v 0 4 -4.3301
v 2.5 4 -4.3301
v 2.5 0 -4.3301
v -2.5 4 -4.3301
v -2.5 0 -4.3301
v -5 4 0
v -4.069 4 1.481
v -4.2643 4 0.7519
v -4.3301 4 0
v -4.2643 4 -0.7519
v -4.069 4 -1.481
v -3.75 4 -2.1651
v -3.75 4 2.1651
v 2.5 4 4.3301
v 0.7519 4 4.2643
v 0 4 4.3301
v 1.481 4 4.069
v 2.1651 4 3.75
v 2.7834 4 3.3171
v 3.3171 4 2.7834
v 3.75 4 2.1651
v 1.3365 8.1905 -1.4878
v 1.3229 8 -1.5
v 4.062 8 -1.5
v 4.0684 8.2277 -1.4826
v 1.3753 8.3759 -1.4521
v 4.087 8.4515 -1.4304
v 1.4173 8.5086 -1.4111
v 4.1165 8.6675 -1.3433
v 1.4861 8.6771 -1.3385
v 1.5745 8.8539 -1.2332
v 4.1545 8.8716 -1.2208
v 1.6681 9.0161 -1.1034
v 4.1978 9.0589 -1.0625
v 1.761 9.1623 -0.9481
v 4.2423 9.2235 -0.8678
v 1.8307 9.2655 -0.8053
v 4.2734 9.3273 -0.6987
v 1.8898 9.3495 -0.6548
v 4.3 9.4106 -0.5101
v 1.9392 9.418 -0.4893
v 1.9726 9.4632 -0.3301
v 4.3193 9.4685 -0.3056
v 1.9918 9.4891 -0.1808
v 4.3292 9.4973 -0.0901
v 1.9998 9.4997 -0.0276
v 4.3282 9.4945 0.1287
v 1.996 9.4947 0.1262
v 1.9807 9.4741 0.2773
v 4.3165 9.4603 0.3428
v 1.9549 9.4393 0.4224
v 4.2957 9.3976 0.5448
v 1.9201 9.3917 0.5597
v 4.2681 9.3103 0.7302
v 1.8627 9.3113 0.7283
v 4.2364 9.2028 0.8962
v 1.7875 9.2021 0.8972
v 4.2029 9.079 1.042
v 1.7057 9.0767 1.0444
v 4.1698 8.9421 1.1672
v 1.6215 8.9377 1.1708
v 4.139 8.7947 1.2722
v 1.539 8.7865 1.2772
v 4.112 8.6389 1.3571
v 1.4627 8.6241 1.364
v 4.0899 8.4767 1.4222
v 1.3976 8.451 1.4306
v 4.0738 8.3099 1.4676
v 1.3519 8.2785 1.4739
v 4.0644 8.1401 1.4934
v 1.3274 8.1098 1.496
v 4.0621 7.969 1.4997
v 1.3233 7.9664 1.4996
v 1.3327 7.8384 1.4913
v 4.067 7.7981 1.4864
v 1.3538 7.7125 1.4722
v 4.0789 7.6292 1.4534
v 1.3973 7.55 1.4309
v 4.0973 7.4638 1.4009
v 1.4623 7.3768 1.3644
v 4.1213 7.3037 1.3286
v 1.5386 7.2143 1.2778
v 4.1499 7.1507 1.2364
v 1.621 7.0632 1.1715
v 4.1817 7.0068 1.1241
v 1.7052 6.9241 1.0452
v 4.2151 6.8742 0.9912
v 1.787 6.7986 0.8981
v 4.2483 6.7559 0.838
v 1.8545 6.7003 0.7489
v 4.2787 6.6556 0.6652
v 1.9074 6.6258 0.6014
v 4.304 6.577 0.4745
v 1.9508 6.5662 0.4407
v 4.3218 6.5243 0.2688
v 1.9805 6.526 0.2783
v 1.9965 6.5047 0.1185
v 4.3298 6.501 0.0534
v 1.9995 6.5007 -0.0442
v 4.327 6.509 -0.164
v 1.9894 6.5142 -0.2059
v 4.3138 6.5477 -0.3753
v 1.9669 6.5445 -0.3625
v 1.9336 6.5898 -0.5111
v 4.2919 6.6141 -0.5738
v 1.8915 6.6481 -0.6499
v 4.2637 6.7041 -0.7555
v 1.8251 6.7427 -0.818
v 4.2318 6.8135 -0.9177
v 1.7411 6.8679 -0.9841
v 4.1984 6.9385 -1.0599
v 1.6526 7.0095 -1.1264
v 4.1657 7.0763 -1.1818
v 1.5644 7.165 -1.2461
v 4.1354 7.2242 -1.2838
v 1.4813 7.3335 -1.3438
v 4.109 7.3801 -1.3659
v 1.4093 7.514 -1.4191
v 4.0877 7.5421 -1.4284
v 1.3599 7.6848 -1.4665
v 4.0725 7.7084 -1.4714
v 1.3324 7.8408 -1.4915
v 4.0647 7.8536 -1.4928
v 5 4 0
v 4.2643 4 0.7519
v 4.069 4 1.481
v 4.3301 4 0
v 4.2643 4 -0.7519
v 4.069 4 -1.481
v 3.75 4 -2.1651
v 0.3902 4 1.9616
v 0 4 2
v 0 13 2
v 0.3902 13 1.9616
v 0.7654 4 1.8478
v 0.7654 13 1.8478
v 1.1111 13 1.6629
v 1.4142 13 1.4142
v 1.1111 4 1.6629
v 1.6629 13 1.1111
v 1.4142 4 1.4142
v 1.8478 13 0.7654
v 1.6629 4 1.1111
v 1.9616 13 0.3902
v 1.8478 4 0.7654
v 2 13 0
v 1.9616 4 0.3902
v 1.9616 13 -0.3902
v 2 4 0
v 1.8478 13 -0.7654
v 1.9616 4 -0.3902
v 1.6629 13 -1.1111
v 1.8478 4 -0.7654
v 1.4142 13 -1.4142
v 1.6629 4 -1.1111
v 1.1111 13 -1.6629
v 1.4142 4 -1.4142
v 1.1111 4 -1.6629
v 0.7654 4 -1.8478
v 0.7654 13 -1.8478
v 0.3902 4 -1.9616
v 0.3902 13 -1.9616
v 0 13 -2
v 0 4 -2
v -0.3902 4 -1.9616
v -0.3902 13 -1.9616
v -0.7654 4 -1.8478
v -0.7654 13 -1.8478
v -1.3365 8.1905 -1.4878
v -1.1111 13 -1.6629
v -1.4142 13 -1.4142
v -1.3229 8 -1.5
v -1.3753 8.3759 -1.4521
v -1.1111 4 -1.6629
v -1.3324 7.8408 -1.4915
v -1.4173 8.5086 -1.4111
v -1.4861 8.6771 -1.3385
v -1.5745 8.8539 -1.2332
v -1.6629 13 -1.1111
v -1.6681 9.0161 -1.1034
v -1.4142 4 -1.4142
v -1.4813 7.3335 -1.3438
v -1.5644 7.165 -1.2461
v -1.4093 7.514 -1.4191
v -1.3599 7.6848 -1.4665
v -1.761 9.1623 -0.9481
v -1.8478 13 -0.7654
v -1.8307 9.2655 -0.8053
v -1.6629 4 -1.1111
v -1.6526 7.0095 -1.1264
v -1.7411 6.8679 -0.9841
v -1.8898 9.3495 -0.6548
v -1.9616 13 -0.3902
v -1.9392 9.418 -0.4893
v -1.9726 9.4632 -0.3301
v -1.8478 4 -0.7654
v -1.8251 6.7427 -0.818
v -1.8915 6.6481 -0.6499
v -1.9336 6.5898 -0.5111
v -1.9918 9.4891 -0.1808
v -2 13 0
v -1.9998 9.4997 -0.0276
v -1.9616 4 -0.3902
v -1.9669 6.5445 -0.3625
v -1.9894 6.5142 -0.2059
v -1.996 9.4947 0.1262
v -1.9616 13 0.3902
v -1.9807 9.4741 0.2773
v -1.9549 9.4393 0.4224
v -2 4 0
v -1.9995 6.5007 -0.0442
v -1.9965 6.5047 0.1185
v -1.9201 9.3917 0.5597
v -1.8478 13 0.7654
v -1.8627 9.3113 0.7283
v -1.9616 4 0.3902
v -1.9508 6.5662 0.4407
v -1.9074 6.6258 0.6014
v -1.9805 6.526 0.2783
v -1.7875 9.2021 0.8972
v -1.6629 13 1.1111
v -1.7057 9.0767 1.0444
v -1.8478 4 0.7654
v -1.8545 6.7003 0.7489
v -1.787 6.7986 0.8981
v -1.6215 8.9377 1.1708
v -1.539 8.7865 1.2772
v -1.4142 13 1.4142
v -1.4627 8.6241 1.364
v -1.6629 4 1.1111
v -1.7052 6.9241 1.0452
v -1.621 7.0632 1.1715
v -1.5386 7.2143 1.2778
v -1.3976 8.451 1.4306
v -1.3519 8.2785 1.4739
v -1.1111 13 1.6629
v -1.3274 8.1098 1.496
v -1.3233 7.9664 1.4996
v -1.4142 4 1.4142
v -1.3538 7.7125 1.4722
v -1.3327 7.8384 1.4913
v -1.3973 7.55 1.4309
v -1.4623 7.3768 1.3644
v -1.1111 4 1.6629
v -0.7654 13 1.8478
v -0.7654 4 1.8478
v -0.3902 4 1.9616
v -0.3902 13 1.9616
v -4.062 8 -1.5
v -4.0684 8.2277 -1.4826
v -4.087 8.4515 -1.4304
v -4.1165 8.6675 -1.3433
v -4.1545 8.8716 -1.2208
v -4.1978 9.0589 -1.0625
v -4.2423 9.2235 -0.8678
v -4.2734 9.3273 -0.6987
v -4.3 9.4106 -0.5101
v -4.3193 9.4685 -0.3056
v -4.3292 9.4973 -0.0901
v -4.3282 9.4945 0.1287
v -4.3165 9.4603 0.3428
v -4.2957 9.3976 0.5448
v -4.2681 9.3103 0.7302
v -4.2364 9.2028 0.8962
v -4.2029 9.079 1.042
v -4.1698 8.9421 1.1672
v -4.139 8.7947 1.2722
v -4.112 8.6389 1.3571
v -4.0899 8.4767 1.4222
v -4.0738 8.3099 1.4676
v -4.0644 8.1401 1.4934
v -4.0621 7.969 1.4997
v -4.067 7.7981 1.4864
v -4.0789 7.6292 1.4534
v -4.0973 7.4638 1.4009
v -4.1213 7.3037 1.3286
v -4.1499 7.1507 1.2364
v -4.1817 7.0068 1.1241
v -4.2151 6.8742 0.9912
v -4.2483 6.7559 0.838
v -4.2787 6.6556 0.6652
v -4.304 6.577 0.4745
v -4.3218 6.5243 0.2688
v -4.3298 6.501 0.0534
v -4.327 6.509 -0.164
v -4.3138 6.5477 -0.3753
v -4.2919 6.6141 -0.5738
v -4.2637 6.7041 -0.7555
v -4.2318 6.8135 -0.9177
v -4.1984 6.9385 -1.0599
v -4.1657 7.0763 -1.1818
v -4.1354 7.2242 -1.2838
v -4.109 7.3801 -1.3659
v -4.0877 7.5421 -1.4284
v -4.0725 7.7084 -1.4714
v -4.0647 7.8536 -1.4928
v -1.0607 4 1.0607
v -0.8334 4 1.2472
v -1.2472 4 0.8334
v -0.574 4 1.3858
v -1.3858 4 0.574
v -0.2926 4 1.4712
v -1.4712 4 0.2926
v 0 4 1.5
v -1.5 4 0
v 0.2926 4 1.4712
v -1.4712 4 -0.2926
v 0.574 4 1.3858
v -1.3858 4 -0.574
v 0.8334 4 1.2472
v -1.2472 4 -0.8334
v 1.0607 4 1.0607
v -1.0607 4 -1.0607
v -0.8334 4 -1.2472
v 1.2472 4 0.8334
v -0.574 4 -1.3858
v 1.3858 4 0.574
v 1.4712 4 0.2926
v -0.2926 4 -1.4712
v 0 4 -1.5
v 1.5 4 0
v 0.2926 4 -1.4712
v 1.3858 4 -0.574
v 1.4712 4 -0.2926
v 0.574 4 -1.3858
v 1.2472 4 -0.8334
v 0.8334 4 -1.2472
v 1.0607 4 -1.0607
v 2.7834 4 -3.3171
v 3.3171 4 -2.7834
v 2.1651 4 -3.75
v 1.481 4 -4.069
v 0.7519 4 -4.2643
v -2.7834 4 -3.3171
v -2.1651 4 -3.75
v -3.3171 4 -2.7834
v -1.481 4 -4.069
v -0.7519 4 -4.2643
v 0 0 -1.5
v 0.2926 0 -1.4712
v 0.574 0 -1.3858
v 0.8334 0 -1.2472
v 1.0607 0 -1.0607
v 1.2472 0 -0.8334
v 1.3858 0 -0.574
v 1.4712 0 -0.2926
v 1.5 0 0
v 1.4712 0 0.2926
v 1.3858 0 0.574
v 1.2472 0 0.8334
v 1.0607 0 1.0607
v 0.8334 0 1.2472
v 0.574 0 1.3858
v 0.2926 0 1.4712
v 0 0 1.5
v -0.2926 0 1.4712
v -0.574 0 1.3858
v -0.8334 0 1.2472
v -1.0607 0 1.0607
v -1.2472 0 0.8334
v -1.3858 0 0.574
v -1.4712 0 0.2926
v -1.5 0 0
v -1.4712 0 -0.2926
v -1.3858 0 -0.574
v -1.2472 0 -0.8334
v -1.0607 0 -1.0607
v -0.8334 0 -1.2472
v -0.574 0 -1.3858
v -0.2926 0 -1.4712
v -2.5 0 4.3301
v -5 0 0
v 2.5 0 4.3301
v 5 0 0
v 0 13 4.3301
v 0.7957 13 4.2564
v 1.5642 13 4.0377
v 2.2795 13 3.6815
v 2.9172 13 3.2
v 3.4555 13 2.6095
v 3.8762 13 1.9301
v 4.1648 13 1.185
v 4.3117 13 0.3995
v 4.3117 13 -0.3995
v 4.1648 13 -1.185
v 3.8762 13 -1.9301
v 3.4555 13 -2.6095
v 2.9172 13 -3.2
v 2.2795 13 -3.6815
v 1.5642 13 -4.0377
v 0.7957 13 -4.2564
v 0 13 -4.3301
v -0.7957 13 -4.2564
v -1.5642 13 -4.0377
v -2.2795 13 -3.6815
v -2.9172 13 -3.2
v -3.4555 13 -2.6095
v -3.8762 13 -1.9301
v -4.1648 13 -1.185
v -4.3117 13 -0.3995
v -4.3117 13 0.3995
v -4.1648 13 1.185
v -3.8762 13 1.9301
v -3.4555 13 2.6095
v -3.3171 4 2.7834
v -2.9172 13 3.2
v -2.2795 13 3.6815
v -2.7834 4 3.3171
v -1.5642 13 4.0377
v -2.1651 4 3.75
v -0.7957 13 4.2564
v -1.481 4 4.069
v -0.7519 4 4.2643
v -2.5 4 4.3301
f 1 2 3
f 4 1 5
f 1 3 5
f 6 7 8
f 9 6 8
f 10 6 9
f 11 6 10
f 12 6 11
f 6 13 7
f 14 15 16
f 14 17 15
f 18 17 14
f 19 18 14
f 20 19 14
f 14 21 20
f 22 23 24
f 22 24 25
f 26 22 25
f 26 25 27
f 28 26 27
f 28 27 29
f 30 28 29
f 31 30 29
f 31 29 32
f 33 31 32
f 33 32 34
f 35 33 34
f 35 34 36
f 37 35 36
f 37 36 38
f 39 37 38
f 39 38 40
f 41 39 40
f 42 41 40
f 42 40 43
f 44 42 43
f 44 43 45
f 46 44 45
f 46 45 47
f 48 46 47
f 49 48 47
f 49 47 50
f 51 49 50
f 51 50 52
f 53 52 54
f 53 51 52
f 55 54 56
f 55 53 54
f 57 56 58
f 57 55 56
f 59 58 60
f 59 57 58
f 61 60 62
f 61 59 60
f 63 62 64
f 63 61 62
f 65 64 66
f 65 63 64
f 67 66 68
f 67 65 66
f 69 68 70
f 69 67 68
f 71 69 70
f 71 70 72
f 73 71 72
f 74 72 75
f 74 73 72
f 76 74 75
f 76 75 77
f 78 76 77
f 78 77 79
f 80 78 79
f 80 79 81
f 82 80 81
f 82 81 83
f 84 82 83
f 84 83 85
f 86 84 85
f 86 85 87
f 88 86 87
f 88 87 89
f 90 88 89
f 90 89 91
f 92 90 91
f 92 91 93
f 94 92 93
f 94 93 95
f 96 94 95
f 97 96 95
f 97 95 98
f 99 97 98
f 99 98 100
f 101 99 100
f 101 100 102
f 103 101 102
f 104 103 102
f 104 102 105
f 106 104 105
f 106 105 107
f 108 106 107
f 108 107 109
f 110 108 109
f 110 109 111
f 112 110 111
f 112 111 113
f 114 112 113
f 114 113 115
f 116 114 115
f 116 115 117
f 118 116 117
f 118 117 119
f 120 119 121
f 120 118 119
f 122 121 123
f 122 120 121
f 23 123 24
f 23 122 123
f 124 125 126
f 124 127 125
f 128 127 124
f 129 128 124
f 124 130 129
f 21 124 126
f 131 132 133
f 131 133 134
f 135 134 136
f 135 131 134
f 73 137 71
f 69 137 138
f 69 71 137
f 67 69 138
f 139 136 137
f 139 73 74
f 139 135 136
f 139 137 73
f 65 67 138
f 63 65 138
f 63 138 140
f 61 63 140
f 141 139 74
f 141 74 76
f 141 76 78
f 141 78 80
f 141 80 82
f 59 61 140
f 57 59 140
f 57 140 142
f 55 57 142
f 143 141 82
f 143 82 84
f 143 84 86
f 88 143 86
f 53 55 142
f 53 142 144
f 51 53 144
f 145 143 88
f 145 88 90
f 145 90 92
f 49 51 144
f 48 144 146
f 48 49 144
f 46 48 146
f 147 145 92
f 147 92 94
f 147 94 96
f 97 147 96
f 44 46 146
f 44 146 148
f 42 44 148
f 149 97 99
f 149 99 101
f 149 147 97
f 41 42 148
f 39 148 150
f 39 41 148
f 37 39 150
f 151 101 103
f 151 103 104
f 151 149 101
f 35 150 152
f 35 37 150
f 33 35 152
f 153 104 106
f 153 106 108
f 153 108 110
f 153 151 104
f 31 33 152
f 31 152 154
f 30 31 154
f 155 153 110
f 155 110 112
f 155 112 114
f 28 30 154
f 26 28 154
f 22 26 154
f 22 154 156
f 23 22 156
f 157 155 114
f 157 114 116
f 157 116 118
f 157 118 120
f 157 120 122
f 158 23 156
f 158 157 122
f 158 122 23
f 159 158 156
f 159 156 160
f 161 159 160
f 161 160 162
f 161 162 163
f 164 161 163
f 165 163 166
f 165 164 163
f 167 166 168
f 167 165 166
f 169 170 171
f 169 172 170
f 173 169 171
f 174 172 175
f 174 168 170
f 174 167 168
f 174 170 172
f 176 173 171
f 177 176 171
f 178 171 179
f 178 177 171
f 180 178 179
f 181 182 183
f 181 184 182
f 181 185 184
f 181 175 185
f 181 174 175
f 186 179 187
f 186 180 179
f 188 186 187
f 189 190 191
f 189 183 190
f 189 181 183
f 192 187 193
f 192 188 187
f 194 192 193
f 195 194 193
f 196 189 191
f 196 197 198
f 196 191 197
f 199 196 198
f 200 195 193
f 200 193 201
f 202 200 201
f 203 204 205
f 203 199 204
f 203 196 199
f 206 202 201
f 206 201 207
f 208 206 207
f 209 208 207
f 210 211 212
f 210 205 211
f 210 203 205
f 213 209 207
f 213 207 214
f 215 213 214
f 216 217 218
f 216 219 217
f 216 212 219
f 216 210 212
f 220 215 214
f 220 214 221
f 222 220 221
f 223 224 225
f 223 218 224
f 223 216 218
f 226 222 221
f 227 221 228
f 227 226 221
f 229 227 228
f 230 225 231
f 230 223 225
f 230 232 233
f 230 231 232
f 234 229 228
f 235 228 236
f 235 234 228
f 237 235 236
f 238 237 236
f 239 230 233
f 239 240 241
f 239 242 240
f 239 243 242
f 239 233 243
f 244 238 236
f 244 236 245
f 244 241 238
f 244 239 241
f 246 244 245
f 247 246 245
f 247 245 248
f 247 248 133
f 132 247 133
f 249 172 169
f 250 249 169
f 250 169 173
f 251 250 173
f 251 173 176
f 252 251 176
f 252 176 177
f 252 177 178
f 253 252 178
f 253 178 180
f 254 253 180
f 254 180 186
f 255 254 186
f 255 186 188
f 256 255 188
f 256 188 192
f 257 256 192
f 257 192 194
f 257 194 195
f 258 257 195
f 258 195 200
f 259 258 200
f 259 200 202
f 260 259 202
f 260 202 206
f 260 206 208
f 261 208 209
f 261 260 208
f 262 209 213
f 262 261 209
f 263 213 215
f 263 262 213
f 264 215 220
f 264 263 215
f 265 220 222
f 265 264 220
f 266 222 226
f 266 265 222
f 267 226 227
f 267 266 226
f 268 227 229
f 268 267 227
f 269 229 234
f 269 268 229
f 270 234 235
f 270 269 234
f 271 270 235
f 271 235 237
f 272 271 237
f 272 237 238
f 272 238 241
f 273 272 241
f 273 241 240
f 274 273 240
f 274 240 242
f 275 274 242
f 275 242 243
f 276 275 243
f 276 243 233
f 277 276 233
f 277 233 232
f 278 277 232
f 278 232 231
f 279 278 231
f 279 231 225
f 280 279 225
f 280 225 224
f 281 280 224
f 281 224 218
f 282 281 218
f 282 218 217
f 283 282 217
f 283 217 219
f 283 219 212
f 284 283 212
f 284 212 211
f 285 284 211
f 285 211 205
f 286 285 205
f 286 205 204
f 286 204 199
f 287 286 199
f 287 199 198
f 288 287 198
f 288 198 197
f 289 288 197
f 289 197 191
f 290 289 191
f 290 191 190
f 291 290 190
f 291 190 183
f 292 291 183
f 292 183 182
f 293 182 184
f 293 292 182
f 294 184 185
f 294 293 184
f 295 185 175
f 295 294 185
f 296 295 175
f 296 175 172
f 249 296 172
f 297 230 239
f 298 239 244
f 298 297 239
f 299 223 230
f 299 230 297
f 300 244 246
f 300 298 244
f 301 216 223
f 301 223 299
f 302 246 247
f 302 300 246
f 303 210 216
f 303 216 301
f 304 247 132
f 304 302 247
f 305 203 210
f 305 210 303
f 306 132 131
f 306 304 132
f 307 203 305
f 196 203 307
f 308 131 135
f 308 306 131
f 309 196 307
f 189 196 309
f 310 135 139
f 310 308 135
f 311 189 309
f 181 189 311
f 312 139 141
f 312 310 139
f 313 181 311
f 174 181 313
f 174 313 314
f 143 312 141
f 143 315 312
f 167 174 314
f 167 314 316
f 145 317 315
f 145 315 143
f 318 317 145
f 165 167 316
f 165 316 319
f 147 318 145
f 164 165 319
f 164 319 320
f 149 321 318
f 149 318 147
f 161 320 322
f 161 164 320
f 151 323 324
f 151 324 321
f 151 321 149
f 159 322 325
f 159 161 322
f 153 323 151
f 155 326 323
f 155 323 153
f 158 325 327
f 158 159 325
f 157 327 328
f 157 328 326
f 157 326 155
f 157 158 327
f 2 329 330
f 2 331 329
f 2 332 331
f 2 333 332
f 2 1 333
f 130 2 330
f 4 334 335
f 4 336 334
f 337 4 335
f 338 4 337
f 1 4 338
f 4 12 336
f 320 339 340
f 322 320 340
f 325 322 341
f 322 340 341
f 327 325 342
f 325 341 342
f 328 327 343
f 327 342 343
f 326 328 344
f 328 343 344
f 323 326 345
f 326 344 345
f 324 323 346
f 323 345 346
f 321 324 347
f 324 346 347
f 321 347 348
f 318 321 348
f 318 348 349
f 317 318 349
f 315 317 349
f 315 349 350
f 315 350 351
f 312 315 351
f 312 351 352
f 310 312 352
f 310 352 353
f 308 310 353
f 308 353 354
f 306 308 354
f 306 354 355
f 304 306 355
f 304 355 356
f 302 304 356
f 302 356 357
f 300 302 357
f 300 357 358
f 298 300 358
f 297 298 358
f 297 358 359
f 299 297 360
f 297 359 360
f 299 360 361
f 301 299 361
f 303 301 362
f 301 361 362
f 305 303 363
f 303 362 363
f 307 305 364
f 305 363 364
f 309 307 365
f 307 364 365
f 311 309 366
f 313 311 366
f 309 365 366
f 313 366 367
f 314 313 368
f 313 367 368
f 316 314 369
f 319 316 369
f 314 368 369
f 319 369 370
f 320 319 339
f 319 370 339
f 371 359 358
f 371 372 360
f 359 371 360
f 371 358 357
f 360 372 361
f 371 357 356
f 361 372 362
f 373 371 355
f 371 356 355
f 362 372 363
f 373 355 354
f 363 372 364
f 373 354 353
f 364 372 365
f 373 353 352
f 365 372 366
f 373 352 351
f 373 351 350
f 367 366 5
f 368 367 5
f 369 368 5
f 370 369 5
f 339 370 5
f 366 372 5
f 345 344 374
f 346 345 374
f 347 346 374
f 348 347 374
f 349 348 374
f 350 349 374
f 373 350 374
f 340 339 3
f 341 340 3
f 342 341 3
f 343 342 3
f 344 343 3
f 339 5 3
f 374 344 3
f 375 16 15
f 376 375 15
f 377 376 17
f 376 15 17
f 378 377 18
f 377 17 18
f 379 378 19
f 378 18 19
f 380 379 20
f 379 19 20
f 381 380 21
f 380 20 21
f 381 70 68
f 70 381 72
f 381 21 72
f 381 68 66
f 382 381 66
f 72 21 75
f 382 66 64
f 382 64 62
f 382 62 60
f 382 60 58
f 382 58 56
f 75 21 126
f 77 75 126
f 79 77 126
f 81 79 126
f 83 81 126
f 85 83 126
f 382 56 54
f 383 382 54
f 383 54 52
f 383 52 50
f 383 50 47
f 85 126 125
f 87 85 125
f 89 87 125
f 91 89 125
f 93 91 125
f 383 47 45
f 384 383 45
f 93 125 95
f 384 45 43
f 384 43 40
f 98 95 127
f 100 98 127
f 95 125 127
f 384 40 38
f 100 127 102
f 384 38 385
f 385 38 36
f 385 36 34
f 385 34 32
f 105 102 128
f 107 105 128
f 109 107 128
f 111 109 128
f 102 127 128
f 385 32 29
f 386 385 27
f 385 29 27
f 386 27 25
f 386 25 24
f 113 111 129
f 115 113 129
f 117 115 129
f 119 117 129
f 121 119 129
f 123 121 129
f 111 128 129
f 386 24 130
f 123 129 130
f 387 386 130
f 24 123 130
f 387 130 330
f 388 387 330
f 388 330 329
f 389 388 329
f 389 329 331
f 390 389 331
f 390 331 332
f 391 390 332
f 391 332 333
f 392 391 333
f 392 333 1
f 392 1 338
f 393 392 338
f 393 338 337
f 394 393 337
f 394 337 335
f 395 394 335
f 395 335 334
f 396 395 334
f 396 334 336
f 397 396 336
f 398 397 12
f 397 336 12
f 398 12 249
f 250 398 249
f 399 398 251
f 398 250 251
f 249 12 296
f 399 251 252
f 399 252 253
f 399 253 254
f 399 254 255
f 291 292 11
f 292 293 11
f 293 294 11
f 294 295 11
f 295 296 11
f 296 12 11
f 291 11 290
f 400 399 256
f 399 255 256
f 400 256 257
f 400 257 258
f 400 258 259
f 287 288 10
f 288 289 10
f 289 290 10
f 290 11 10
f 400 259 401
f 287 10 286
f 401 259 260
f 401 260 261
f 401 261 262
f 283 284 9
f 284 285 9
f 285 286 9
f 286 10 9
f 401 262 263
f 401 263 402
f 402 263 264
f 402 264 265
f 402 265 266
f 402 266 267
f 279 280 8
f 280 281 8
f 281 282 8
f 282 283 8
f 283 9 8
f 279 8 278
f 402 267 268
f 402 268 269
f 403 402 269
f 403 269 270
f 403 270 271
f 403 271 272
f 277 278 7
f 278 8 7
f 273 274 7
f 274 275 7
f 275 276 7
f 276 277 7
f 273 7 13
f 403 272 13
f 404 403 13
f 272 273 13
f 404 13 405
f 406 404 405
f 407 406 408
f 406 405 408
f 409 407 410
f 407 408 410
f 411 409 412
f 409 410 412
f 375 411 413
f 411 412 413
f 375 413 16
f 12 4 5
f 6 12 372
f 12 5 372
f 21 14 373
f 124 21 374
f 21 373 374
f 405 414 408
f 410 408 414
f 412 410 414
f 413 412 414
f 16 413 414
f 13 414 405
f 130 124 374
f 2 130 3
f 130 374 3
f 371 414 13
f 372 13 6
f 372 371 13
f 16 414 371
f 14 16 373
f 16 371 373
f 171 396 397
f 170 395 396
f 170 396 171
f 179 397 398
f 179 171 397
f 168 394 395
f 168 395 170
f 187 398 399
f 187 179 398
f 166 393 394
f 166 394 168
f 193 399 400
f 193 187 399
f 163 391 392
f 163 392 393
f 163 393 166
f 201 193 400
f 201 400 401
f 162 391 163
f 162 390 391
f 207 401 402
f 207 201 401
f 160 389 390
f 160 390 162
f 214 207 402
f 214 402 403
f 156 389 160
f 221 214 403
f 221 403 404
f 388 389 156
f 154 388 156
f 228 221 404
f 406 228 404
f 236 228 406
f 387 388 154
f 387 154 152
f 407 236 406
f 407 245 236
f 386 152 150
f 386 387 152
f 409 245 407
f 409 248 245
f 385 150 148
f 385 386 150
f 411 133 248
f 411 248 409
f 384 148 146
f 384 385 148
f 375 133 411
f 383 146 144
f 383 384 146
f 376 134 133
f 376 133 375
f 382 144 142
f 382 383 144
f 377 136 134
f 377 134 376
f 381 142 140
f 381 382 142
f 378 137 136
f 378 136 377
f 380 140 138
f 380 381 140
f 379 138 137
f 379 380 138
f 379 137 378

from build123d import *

# Parameters (mm, degrees)
EXTRUDE_1_DEPTH          = 4
SKETCH_3_R               = 4.330127019
SKETCH_3_R_2             = 2
EXTRUDE_2_DEPTH          = 9
SKETCH_4_R               = 1.5
CUT_EXTRUDE_1_DEPTH      = 15
CUT_EXTRUDE_2_DEPTH      = 15.585952146
CUT_EXTRUDE_2_DEPTH_BACK = 15.585952146
SKETCH_5_R               = 1.5


with BuildPart() as part:
    # 草图2 → 凸台-拉伸1 (new body)
    with BuildSketch(Plane(origin=(0, 0, 0), x_dir=(1, 0, 0), z_dir=(0, 1, 0))):
        Polygon((0, 0), (-2.5, 4.330127019), (-5, 0), align=None)
        Polygon((-2.5, -4.330127019), (-5, 0), (0, 0), align=None)
        Polygon((0, 0), (-2.5, -4.330127019), (2.5, -4.330127019), align=None)
        Polygon((0, 0), (2.5, -4.330127019), (5, 0), align=None)
        Polygon((0, 0), (5, 0), (2.5, 4.330127019), align=None)
        Polygon((0, 0), (2.5, 4.330127019), (-2.5, 4.330127019), align=None)
    extrude(amount=EXTRUDE_1_DEPTH)

    # 草图3 → 凸台-拉伸2 (add)
    with BuildSketch(Plane(origin=(0, 4, 0), x_dir=(1, 0, 0), z_dir=(0, 1, 0))):
        with Locations(Location((0, 0, 0), (0, 0, 270))):
            Circle(SKETCH_3_R)
        with Locations(Location((0, 0, 0), (0, 0, 270))):
            Circle(SKETCH_3_R_2, mode=Mode.SUBTRACT)
    extrude(amount=EXTRUDE_2_DEPTH)

    # 草图4 → 切除-拉伸1 (cut)
    with BuildSketch(Plane.XZ):
        with Locations(Location((0, 0, 0), (0, 0, 270))):
            Circle(SKETCH_4_R)
    extrude(amount=-CUT_EXTRUDE_1_DEPTH, mode=Mode.SUBTRACT)

    # 草图5 → 切除-拉伸2 (cut, two sides: drawn at the far end of the back side and taken through both)
    with BuildSketch(Plane(origin=(0, 0, 0), x_dir=(0, 0, -1), z_dir=(1, 0, 0)).offset(-CUT_EXTRUDE_2_DEPTH_BACK)):
        with Locations((0, 8)):
            Circle(SKETCH_5_R)
    extrude(amount=CUT_EXTRUDE_2_DEPTH + CUT_EXTRUDE_2_DEPTH_BACK, mode=Mode.SUBTRACT)


solid = part.part
